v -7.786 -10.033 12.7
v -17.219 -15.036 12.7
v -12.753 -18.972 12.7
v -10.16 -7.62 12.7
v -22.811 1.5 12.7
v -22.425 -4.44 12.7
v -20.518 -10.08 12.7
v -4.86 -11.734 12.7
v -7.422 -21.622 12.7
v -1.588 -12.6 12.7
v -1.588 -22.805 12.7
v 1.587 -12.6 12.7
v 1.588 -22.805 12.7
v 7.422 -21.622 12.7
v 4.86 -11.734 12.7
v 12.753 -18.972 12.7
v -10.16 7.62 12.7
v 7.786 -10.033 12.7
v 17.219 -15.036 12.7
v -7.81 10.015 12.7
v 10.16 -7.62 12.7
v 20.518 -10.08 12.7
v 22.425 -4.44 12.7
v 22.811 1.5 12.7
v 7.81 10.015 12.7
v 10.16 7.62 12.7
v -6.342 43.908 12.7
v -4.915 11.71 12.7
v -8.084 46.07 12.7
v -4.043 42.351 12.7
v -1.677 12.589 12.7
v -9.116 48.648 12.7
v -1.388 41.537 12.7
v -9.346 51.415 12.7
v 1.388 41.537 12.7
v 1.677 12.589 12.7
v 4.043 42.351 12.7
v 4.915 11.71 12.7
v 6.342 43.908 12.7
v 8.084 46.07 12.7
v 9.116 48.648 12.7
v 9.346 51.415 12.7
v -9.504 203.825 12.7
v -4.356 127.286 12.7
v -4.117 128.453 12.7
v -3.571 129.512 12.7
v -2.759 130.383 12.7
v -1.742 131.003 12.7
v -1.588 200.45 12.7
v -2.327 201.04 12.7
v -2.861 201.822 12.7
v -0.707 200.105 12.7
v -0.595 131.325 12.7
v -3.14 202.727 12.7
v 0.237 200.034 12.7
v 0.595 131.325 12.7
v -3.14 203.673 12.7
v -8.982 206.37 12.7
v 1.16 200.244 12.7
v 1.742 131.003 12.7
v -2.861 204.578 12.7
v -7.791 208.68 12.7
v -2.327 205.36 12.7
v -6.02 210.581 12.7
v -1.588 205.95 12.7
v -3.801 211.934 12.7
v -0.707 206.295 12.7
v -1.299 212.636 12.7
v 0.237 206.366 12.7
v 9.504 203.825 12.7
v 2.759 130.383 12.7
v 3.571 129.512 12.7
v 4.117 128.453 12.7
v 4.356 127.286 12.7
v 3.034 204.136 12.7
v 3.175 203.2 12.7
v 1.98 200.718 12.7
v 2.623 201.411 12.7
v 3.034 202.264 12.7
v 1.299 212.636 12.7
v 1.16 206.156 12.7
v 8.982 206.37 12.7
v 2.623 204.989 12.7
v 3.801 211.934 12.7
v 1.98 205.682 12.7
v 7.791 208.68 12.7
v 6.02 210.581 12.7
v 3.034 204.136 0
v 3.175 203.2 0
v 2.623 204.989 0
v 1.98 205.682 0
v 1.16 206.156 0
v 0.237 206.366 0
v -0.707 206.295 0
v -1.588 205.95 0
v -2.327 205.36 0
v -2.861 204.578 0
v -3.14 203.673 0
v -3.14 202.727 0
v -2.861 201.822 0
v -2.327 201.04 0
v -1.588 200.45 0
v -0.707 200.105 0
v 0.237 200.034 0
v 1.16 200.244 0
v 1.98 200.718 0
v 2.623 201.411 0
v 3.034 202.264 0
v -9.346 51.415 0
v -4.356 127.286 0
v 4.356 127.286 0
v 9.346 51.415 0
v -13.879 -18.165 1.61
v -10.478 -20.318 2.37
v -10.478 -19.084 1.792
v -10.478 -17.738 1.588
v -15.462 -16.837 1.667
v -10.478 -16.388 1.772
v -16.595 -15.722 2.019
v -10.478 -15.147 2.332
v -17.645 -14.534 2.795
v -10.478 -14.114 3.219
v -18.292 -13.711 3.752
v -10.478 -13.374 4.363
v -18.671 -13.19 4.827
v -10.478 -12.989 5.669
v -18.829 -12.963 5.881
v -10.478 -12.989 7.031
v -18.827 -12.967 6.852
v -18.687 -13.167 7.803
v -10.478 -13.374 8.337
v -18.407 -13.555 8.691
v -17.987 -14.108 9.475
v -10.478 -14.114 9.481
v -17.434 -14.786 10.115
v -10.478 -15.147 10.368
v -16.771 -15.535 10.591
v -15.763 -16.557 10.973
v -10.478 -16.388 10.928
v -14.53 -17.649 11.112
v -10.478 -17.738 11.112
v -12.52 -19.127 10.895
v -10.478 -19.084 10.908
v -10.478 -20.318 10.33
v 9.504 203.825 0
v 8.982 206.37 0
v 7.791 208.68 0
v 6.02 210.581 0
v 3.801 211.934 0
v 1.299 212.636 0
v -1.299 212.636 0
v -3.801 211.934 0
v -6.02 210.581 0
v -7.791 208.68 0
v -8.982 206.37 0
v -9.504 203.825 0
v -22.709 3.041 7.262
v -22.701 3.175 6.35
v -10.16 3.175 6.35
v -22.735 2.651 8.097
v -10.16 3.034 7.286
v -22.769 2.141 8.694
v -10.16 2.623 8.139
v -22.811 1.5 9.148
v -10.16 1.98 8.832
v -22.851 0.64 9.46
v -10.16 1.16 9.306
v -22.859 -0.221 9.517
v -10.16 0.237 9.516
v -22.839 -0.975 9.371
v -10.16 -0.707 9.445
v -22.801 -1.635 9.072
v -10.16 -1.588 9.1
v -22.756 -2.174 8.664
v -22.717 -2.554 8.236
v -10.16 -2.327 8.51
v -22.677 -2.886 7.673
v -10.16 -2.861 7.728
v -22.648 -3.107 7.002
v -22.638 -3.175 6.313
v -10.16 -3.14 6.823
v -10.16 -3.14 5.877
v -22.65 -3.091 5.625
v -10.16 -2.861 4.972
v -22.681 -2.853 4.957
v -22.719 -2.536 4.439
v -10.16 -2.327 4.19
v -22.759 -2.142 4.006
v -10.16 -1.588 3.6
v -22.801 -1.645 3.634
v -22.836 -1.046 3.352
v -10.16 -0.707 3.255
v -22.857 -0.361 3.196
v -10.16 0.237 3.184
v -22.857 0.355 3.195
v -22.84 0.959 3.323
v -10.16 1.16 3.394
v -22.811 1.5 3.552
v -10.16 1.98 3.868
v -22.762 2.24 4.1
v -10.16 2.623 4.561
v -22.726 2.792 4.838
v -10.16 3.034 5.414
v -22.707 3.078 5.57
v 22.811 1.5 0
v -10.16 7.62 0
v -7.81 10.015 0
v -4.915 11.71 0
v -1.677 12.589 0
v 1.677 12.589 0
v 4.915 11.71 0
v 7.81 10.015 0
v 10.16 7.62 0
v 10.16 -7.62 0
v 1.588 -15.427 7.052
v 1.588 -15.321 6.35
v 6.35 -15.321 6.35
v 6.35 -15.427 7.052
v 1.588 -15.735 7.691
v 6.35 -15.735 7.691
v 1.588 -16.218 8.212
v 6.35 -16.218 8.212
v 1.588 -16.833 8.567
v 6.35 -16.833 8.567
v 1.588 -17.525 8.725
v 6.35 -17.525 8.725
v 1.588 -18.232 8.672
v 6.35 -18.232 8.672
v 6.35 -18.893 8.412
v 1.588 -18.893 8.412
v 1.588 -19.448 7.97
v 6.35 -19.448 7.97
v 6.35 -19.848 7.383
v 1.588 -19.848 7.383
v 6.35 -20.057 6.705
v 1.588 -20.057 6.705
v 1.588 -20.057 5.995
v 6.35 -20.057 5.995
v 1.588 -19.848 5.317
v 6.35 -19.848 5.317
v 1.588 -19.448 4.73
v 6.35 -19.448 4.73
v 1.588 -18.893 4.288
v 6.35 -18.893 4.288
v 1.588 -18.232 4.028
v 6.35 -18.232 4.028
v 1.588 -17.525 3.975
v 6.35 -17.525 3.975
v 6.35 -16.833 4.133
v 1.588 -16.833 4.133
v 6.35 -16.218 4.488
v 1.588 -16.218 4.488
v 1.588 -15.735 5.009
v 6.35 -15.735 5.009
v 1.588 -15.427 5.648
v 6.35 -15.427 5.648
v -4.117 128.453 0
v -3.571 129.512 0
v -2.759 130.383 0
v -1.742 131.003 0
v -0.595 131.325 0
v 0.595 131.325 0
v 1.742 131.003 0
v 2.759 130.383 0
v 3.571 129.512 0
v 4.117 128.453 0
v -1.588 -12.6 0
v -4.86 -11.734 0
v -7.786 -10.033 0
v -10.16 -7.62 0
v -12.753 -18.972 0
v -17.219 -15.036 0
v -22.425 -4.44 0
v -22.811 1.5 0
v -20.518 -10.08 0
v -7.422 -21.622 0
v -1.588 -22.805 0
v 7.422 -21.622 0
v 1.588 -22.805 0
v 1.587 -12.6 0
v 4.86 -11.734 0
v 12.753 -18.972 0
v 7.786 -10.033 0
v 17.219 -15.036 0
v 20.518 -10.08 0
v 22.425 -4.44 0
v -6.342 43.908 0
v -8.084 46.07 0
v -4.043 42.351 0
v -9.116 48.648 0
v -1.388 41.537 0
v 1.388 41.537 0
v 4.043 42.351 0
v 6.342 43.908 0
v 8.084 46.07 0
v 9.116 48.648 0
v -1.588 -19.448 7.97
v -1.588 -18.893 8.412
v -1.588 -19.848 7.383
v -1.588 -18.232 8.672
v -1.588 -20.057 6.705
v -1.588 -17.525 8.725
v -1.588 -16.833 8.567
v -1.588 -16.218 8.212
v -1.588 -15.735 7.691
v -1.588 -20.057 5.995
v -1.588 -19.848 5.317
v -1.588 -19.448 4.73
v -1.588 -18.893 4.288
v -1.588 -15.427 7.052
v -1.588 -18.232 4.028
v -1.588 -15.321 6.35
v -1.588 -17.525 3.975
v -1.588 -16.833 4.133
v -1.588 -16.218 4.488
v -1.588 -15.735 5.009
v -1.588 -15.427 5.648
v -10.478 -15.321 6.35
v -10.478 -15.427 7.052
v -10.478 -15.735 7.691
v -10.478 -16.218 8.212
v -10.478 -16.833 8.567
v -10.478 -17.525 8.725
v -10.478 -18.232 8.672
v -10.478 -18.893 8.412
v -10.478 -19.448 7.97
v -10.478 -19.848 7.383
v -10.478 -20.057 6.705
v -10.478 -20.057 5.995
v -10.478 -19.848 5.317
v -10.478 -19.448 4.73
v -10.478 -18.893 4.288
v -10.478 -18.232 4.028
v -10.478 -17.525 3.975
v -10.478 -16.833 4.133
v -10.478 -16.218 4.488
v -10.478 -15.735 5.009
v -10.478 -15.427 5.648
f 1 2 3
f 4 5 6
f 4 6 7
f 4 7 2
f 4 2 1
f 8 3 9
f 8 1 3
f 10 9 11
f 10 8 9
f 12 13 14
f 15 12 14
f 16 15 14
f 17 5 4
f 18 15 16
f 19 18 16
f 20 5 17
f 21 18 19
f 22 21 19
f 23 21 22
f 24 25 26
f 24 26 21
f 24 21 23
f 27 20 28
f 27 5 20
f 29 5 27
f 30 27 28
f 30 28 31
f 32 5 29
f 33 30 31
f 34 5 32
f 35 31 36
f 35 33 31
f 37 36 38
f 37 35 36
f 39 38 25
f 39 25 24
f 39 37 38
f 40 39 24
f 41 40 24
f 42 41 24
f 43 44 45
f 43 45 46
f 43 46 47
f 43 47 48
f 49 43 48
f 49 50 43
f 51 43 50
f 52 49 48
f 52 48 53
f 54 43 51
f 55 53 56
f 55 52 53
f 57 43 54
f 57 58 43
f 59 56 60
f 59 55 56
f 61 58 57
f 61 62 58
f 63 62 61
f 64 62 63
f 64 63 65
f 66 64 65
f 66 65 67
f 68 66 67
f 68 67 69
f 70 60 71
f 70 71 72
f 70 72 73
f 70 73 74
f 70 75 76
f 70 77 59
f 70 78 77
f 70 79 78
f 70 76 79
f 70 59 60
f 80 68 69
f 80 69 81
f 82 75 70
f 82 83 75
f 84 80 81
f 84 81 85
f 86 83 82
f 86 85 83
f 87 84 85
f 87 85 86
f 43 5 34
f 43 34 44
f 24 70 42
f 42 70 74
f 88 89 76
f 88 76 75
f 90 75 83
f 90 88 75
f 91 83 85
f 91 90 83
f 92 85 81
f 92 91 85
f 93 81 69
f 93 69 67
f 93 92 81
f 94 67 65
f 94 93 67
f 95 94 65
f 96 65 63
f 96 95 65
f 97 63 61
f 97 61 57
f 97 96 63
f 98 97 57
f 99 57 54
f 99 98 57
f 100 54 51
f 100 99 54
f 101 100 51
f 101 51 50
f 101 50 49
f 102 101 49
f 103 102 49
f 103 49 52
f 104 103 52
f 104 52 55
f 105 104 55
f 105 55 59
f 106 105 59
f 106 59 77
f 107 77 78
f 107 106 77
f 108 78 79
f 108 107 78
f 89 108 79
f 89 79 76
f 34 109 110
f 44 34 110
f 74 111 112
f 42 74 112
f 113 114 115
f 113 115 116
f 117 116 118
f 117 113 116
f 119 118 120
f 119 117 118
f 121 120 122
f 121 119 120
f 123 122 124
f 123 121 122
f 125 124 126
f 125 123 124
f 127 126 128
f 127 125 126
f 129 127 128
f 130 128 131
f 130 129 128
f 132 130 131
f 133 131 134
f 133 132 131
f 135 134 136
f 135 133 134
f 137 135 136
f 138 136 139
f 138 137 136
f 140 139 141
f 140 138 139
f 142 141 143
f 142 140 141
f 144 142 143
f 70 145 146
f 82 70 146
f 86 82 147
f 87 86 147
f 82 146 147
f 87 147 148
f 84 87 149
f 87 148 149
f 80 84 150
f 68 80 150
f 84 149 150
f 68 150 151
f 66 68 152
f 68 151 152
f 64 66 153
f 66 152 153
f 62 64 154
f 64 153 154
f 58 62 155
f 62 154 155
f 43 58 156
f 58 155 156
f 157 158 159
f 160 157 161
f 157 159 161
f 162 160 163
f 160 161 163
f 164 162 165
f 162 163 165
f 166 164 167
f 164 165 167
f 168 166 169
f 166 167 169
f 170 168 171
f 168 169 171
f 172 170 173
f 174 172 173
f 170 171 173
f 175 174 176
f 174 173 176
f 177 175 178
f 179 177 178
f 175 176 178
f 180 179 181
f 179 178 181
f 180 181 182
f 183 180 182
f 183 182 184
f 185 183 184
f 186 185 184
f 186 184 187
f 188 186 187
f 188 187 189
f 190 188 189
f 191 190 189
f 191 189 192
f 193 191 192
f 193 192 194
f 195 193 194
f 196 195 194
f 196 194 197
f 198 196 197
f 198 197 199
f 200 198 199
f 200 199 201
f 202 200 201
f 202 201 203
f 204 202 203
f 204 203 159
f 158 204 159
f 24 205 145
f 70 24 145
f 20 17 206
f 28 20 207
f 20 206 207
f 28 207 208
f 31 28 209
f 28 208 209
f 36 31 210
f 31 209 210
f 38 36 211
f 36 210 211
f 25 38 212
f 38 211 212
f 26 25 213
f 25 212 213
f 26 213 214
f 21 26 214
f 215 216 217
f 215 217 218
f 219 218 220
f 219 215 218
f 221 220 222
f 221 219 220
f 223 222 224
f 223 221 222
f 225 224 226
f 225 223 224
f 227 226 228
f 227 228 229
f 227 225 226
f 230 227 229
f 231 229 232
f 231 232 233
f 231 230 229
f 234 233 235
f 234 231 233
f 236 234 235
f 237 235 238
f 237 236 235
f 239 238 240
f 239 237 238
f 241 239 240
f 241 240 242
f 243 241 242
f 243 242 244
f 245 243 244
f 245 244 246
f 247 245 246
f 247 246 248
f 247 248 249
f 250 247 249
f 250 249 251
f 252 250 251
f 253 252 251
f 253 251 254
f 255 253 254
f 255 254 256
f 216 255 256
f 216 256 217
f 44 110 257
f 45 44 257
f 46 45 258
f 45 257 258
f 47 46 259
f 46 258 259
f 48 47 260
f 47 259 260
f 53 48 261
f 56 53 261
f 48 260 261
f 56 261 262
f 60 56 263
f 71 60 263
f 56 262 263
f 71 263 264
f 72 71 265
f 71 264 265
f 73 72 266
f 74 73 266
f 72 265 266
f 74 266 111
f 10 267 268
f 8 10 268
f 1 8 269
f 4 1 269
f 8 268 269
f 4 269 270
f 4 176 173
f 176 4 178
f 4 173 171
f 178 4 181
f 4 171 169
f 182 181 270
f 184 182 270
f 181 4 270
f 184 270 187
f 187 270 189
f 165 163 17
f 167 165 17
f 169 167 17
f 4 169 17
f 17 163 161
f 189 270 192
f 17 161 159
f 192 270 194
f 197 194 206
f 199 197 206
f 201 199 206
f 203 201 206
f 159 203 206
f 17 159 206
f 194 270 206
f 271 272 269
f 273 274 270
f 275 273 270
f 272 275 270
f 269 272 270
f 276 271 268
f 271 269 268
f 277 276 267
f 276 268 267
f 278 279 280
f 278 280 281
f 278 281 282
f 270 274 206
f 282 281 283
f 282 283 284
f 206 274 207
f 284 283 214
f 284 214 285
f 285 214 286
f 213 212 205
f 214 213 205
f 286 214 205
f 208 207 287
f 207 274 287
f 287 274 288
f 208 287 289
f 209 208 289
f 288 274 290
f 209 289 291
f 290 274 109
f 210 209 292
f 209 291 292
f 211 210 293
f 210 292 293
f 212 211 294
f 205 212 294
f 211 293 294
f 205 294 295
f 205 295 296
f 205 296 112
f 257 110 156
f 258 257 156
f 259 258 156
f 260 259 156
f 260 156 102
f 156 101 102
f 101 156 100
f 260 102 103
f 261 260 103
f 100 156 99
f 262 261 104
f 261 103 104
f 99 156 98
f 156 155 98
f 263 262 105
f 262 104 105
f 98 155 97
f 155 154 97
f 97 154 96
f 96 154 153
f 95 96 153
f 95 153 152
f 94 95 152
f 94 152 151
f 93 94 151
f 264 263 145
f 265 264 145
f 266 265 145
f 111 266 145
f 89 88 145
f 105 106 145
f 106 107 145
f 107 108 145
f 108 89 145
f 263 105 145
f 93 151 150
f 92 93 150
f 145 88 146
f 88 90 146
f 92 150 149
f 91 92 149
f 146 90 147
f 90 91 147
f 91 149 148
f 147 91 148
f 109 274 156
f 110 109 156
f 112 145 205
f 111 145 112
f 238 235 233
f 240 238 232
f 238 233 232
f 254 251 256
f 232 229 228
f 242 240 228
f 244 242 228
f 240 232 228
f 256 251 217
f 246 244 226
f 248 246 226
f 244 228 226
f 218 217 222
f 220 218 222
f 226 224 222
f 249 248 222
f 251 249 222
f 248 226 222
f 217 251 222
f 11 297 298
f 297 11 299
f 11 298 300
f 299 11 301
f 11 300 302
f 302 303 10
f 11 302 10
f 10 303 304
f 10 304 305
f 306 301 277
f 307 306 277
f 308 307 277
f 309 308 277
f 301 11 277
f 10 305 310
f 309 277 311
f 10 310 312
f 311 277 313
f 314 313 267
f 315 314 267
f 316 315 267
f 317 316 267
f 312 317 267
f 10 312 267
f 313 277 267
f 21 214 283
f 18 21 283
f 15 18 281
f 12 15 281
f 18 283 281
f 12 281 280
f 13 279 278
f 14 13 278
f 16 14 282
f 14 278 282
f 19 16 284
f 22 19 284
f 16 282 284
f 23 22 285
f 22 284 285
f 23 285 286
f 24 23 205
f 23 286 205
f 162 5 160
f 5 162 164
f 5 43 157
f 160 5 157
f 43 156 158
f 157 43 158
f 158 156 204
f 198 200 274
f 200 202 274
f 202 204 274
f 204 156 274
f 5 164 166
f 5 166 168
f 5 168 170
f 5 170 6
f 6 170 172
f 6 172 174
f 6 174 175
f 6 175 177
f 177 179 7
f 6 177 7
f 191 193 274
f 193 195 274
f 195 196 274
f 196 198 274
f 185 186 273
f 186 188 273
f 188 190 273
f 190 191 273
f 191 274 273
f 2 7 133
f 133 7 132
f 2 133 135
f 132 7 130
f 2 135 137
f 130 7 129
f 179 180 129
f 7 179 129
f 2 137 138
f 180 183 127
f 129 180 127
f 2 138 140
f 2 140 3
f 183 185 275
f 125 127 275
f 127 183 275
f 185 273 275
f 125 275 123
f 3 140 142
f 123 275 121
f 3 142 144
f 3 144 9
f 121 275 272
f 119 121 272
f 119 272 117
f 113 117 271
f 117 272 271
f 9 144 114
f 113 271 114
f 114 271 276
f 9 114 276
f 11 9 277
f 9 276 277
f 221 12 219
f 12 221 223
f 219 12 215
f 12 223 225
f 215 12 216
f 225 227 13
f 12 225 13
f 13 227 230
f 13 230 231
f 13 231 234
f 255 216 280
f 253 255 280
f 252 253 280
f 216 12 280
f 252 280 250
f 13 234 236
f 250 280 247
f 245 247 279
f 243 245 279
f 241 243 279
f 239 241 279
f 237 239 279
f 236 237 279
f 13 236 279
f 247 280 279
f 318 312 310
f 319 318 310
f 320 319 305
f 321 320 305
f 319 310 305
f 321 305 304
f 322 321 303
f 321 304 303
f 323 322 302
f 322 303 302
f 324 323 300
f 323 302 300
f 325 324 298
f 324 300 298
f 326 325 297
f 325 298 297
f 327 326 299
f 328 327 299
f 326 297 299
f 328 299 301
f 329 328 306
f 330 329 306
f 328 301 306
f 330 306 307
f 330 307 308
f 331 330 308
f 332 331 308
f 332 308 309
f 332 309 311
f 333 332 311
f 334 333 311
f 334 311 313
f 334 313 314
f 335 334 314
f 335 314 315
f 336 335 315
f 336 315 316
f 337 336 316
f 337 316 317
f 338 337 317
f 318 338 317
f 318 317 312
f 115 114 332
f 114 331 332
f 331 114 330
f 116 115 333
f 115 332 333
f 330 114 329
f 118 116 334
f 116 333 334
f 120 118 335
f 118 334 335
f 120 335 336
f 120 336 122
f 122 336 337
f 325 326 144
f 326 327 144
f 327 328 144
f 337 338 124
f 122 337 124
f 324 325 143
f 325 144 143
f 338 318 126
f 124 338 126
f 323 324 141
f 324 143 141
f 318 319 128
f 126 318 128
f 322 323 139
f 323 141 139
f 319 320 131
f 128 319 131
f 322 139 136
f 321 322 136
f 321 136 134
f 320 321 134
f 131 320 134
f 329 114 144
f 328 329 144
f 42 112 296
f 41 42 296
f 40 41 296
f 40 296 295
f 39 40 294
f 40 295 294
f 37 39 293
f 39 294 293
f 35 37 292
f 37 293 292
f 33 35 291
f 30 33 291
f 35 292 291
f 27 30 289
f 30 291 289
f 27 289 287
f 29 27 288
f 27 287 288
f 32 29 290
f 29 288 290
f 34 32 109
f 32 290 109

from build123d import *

# Parameters (mm, degrees)
F0_R          = 3.175
F1_DEPTH      = 12.7
F2_R          = 3.175
F3_DEPTH      = 25.4
F4_R          = 2.38125
F5_DEPTH      = 6.35
F5_DEPTH_BACK = 22.8610001193
F7_R          = 4.7625
F8_DEPTH      = 10.16


with BuildPart() as f1:
    # F0 (on Top) → F1 (new body)
    with BuildSketch(Plane.XY):
        with BuildLine():
            Line((-9.5044674936, 203.825078125), (-22.8107219847, 1.5001875))
            ThreePointArc((-22.8107219847, 1.5001875), (-17.219220581, -15.035891812), (-1.5875, -22.8048118552))
            Line((-1.5875, -22.8048118552), (-1.5875, -12.6003906189))
            ThreePointArc((-1.5875, -12.6003906189), (-6.3798128297, -10.981256224), (-10.16, -7.62))
            Line((-10.16, -7.62), (-10.16, 7.62))
            ThreePointArc((-10.16, 7.62), (0, 12.7), (10.16, 7.62))
            Line((10.16, 7.62), (10.16, -7.62))
            ThreePointArc((10.16, -7.62), (6.3798128297, -10.981256224), (1.5875, -12.6003906189))
            Line((1.5875, -12.6003906189), (1.5875, -22.8048118552))
            ThreePointArc((1.5875, -22.8048118552), (17.219220581, -15.035891812), (22.8107219847, 1.5001875))
            Line((22.8107219847, 1.5001875), (9.5044674936, 203.825078125))
            ThreePointArc((9.5044674936, 203.825078125), (0, 212.725), (-9.5044674936, 203.825078125))
        make_face()
        with BuildLine():
            ThreePointArc((9.3460597021, 51.4146601563), (0, 41.43375), (-9.3460597021, 51.4146601563))
            Line((-9.3460597021, 51.4146601563), (-4.3562142679, 127.2864941406))
            ThreePointArc((-4.3562142679, 127.2864941406), (0, 131.365625), (4.3562142679, 127.2864941406))
            Line((4.3562142679, 127.2864941406), (9.3460597021, 51.4146601563))
        make_face(mode=Mode.SUBTRACT)
        with Locations((0, 203.2)):
            Circle(F0_R, mode=Mode.SUBTRACT)
    extrude(amount=F1_DEPTH)

    # F2 (on face) → F3 (cut)
    with BuildSketch(Plane.YZ.offset(-10.16)):
        with Locations((0, 6.35)):
            Circle(F2_R)
    extrude(amount=-F3_DEPTH, mode=Mode.SUBTRACT)

    # F4 (on Right) → F5 (cut, two sides)
    with BuildSketch(Plane.YZ) as f5_sk:
        with Locations((-17.7026012371, 6.35)):
            Circle(F4_R)
    extrude(amount=F5_DEPTH, mode=Mode.SUBTRACT)
    extrude(f5_sk.sketch, amount=-F5_DEPTH_BACK, mode=Mode.SUBTRACT)

    # F7 (on offset) → F8 (cut)
    with BuildSketch(Plane.YZ.offset(-20.6375)):
        with Locations((-17.7026012371, 6.35)):
            Circle(F7_R)
    extrude(amount=F8_DEPTH, mode=Mode.SUBTRACT)


solid = f1.part
